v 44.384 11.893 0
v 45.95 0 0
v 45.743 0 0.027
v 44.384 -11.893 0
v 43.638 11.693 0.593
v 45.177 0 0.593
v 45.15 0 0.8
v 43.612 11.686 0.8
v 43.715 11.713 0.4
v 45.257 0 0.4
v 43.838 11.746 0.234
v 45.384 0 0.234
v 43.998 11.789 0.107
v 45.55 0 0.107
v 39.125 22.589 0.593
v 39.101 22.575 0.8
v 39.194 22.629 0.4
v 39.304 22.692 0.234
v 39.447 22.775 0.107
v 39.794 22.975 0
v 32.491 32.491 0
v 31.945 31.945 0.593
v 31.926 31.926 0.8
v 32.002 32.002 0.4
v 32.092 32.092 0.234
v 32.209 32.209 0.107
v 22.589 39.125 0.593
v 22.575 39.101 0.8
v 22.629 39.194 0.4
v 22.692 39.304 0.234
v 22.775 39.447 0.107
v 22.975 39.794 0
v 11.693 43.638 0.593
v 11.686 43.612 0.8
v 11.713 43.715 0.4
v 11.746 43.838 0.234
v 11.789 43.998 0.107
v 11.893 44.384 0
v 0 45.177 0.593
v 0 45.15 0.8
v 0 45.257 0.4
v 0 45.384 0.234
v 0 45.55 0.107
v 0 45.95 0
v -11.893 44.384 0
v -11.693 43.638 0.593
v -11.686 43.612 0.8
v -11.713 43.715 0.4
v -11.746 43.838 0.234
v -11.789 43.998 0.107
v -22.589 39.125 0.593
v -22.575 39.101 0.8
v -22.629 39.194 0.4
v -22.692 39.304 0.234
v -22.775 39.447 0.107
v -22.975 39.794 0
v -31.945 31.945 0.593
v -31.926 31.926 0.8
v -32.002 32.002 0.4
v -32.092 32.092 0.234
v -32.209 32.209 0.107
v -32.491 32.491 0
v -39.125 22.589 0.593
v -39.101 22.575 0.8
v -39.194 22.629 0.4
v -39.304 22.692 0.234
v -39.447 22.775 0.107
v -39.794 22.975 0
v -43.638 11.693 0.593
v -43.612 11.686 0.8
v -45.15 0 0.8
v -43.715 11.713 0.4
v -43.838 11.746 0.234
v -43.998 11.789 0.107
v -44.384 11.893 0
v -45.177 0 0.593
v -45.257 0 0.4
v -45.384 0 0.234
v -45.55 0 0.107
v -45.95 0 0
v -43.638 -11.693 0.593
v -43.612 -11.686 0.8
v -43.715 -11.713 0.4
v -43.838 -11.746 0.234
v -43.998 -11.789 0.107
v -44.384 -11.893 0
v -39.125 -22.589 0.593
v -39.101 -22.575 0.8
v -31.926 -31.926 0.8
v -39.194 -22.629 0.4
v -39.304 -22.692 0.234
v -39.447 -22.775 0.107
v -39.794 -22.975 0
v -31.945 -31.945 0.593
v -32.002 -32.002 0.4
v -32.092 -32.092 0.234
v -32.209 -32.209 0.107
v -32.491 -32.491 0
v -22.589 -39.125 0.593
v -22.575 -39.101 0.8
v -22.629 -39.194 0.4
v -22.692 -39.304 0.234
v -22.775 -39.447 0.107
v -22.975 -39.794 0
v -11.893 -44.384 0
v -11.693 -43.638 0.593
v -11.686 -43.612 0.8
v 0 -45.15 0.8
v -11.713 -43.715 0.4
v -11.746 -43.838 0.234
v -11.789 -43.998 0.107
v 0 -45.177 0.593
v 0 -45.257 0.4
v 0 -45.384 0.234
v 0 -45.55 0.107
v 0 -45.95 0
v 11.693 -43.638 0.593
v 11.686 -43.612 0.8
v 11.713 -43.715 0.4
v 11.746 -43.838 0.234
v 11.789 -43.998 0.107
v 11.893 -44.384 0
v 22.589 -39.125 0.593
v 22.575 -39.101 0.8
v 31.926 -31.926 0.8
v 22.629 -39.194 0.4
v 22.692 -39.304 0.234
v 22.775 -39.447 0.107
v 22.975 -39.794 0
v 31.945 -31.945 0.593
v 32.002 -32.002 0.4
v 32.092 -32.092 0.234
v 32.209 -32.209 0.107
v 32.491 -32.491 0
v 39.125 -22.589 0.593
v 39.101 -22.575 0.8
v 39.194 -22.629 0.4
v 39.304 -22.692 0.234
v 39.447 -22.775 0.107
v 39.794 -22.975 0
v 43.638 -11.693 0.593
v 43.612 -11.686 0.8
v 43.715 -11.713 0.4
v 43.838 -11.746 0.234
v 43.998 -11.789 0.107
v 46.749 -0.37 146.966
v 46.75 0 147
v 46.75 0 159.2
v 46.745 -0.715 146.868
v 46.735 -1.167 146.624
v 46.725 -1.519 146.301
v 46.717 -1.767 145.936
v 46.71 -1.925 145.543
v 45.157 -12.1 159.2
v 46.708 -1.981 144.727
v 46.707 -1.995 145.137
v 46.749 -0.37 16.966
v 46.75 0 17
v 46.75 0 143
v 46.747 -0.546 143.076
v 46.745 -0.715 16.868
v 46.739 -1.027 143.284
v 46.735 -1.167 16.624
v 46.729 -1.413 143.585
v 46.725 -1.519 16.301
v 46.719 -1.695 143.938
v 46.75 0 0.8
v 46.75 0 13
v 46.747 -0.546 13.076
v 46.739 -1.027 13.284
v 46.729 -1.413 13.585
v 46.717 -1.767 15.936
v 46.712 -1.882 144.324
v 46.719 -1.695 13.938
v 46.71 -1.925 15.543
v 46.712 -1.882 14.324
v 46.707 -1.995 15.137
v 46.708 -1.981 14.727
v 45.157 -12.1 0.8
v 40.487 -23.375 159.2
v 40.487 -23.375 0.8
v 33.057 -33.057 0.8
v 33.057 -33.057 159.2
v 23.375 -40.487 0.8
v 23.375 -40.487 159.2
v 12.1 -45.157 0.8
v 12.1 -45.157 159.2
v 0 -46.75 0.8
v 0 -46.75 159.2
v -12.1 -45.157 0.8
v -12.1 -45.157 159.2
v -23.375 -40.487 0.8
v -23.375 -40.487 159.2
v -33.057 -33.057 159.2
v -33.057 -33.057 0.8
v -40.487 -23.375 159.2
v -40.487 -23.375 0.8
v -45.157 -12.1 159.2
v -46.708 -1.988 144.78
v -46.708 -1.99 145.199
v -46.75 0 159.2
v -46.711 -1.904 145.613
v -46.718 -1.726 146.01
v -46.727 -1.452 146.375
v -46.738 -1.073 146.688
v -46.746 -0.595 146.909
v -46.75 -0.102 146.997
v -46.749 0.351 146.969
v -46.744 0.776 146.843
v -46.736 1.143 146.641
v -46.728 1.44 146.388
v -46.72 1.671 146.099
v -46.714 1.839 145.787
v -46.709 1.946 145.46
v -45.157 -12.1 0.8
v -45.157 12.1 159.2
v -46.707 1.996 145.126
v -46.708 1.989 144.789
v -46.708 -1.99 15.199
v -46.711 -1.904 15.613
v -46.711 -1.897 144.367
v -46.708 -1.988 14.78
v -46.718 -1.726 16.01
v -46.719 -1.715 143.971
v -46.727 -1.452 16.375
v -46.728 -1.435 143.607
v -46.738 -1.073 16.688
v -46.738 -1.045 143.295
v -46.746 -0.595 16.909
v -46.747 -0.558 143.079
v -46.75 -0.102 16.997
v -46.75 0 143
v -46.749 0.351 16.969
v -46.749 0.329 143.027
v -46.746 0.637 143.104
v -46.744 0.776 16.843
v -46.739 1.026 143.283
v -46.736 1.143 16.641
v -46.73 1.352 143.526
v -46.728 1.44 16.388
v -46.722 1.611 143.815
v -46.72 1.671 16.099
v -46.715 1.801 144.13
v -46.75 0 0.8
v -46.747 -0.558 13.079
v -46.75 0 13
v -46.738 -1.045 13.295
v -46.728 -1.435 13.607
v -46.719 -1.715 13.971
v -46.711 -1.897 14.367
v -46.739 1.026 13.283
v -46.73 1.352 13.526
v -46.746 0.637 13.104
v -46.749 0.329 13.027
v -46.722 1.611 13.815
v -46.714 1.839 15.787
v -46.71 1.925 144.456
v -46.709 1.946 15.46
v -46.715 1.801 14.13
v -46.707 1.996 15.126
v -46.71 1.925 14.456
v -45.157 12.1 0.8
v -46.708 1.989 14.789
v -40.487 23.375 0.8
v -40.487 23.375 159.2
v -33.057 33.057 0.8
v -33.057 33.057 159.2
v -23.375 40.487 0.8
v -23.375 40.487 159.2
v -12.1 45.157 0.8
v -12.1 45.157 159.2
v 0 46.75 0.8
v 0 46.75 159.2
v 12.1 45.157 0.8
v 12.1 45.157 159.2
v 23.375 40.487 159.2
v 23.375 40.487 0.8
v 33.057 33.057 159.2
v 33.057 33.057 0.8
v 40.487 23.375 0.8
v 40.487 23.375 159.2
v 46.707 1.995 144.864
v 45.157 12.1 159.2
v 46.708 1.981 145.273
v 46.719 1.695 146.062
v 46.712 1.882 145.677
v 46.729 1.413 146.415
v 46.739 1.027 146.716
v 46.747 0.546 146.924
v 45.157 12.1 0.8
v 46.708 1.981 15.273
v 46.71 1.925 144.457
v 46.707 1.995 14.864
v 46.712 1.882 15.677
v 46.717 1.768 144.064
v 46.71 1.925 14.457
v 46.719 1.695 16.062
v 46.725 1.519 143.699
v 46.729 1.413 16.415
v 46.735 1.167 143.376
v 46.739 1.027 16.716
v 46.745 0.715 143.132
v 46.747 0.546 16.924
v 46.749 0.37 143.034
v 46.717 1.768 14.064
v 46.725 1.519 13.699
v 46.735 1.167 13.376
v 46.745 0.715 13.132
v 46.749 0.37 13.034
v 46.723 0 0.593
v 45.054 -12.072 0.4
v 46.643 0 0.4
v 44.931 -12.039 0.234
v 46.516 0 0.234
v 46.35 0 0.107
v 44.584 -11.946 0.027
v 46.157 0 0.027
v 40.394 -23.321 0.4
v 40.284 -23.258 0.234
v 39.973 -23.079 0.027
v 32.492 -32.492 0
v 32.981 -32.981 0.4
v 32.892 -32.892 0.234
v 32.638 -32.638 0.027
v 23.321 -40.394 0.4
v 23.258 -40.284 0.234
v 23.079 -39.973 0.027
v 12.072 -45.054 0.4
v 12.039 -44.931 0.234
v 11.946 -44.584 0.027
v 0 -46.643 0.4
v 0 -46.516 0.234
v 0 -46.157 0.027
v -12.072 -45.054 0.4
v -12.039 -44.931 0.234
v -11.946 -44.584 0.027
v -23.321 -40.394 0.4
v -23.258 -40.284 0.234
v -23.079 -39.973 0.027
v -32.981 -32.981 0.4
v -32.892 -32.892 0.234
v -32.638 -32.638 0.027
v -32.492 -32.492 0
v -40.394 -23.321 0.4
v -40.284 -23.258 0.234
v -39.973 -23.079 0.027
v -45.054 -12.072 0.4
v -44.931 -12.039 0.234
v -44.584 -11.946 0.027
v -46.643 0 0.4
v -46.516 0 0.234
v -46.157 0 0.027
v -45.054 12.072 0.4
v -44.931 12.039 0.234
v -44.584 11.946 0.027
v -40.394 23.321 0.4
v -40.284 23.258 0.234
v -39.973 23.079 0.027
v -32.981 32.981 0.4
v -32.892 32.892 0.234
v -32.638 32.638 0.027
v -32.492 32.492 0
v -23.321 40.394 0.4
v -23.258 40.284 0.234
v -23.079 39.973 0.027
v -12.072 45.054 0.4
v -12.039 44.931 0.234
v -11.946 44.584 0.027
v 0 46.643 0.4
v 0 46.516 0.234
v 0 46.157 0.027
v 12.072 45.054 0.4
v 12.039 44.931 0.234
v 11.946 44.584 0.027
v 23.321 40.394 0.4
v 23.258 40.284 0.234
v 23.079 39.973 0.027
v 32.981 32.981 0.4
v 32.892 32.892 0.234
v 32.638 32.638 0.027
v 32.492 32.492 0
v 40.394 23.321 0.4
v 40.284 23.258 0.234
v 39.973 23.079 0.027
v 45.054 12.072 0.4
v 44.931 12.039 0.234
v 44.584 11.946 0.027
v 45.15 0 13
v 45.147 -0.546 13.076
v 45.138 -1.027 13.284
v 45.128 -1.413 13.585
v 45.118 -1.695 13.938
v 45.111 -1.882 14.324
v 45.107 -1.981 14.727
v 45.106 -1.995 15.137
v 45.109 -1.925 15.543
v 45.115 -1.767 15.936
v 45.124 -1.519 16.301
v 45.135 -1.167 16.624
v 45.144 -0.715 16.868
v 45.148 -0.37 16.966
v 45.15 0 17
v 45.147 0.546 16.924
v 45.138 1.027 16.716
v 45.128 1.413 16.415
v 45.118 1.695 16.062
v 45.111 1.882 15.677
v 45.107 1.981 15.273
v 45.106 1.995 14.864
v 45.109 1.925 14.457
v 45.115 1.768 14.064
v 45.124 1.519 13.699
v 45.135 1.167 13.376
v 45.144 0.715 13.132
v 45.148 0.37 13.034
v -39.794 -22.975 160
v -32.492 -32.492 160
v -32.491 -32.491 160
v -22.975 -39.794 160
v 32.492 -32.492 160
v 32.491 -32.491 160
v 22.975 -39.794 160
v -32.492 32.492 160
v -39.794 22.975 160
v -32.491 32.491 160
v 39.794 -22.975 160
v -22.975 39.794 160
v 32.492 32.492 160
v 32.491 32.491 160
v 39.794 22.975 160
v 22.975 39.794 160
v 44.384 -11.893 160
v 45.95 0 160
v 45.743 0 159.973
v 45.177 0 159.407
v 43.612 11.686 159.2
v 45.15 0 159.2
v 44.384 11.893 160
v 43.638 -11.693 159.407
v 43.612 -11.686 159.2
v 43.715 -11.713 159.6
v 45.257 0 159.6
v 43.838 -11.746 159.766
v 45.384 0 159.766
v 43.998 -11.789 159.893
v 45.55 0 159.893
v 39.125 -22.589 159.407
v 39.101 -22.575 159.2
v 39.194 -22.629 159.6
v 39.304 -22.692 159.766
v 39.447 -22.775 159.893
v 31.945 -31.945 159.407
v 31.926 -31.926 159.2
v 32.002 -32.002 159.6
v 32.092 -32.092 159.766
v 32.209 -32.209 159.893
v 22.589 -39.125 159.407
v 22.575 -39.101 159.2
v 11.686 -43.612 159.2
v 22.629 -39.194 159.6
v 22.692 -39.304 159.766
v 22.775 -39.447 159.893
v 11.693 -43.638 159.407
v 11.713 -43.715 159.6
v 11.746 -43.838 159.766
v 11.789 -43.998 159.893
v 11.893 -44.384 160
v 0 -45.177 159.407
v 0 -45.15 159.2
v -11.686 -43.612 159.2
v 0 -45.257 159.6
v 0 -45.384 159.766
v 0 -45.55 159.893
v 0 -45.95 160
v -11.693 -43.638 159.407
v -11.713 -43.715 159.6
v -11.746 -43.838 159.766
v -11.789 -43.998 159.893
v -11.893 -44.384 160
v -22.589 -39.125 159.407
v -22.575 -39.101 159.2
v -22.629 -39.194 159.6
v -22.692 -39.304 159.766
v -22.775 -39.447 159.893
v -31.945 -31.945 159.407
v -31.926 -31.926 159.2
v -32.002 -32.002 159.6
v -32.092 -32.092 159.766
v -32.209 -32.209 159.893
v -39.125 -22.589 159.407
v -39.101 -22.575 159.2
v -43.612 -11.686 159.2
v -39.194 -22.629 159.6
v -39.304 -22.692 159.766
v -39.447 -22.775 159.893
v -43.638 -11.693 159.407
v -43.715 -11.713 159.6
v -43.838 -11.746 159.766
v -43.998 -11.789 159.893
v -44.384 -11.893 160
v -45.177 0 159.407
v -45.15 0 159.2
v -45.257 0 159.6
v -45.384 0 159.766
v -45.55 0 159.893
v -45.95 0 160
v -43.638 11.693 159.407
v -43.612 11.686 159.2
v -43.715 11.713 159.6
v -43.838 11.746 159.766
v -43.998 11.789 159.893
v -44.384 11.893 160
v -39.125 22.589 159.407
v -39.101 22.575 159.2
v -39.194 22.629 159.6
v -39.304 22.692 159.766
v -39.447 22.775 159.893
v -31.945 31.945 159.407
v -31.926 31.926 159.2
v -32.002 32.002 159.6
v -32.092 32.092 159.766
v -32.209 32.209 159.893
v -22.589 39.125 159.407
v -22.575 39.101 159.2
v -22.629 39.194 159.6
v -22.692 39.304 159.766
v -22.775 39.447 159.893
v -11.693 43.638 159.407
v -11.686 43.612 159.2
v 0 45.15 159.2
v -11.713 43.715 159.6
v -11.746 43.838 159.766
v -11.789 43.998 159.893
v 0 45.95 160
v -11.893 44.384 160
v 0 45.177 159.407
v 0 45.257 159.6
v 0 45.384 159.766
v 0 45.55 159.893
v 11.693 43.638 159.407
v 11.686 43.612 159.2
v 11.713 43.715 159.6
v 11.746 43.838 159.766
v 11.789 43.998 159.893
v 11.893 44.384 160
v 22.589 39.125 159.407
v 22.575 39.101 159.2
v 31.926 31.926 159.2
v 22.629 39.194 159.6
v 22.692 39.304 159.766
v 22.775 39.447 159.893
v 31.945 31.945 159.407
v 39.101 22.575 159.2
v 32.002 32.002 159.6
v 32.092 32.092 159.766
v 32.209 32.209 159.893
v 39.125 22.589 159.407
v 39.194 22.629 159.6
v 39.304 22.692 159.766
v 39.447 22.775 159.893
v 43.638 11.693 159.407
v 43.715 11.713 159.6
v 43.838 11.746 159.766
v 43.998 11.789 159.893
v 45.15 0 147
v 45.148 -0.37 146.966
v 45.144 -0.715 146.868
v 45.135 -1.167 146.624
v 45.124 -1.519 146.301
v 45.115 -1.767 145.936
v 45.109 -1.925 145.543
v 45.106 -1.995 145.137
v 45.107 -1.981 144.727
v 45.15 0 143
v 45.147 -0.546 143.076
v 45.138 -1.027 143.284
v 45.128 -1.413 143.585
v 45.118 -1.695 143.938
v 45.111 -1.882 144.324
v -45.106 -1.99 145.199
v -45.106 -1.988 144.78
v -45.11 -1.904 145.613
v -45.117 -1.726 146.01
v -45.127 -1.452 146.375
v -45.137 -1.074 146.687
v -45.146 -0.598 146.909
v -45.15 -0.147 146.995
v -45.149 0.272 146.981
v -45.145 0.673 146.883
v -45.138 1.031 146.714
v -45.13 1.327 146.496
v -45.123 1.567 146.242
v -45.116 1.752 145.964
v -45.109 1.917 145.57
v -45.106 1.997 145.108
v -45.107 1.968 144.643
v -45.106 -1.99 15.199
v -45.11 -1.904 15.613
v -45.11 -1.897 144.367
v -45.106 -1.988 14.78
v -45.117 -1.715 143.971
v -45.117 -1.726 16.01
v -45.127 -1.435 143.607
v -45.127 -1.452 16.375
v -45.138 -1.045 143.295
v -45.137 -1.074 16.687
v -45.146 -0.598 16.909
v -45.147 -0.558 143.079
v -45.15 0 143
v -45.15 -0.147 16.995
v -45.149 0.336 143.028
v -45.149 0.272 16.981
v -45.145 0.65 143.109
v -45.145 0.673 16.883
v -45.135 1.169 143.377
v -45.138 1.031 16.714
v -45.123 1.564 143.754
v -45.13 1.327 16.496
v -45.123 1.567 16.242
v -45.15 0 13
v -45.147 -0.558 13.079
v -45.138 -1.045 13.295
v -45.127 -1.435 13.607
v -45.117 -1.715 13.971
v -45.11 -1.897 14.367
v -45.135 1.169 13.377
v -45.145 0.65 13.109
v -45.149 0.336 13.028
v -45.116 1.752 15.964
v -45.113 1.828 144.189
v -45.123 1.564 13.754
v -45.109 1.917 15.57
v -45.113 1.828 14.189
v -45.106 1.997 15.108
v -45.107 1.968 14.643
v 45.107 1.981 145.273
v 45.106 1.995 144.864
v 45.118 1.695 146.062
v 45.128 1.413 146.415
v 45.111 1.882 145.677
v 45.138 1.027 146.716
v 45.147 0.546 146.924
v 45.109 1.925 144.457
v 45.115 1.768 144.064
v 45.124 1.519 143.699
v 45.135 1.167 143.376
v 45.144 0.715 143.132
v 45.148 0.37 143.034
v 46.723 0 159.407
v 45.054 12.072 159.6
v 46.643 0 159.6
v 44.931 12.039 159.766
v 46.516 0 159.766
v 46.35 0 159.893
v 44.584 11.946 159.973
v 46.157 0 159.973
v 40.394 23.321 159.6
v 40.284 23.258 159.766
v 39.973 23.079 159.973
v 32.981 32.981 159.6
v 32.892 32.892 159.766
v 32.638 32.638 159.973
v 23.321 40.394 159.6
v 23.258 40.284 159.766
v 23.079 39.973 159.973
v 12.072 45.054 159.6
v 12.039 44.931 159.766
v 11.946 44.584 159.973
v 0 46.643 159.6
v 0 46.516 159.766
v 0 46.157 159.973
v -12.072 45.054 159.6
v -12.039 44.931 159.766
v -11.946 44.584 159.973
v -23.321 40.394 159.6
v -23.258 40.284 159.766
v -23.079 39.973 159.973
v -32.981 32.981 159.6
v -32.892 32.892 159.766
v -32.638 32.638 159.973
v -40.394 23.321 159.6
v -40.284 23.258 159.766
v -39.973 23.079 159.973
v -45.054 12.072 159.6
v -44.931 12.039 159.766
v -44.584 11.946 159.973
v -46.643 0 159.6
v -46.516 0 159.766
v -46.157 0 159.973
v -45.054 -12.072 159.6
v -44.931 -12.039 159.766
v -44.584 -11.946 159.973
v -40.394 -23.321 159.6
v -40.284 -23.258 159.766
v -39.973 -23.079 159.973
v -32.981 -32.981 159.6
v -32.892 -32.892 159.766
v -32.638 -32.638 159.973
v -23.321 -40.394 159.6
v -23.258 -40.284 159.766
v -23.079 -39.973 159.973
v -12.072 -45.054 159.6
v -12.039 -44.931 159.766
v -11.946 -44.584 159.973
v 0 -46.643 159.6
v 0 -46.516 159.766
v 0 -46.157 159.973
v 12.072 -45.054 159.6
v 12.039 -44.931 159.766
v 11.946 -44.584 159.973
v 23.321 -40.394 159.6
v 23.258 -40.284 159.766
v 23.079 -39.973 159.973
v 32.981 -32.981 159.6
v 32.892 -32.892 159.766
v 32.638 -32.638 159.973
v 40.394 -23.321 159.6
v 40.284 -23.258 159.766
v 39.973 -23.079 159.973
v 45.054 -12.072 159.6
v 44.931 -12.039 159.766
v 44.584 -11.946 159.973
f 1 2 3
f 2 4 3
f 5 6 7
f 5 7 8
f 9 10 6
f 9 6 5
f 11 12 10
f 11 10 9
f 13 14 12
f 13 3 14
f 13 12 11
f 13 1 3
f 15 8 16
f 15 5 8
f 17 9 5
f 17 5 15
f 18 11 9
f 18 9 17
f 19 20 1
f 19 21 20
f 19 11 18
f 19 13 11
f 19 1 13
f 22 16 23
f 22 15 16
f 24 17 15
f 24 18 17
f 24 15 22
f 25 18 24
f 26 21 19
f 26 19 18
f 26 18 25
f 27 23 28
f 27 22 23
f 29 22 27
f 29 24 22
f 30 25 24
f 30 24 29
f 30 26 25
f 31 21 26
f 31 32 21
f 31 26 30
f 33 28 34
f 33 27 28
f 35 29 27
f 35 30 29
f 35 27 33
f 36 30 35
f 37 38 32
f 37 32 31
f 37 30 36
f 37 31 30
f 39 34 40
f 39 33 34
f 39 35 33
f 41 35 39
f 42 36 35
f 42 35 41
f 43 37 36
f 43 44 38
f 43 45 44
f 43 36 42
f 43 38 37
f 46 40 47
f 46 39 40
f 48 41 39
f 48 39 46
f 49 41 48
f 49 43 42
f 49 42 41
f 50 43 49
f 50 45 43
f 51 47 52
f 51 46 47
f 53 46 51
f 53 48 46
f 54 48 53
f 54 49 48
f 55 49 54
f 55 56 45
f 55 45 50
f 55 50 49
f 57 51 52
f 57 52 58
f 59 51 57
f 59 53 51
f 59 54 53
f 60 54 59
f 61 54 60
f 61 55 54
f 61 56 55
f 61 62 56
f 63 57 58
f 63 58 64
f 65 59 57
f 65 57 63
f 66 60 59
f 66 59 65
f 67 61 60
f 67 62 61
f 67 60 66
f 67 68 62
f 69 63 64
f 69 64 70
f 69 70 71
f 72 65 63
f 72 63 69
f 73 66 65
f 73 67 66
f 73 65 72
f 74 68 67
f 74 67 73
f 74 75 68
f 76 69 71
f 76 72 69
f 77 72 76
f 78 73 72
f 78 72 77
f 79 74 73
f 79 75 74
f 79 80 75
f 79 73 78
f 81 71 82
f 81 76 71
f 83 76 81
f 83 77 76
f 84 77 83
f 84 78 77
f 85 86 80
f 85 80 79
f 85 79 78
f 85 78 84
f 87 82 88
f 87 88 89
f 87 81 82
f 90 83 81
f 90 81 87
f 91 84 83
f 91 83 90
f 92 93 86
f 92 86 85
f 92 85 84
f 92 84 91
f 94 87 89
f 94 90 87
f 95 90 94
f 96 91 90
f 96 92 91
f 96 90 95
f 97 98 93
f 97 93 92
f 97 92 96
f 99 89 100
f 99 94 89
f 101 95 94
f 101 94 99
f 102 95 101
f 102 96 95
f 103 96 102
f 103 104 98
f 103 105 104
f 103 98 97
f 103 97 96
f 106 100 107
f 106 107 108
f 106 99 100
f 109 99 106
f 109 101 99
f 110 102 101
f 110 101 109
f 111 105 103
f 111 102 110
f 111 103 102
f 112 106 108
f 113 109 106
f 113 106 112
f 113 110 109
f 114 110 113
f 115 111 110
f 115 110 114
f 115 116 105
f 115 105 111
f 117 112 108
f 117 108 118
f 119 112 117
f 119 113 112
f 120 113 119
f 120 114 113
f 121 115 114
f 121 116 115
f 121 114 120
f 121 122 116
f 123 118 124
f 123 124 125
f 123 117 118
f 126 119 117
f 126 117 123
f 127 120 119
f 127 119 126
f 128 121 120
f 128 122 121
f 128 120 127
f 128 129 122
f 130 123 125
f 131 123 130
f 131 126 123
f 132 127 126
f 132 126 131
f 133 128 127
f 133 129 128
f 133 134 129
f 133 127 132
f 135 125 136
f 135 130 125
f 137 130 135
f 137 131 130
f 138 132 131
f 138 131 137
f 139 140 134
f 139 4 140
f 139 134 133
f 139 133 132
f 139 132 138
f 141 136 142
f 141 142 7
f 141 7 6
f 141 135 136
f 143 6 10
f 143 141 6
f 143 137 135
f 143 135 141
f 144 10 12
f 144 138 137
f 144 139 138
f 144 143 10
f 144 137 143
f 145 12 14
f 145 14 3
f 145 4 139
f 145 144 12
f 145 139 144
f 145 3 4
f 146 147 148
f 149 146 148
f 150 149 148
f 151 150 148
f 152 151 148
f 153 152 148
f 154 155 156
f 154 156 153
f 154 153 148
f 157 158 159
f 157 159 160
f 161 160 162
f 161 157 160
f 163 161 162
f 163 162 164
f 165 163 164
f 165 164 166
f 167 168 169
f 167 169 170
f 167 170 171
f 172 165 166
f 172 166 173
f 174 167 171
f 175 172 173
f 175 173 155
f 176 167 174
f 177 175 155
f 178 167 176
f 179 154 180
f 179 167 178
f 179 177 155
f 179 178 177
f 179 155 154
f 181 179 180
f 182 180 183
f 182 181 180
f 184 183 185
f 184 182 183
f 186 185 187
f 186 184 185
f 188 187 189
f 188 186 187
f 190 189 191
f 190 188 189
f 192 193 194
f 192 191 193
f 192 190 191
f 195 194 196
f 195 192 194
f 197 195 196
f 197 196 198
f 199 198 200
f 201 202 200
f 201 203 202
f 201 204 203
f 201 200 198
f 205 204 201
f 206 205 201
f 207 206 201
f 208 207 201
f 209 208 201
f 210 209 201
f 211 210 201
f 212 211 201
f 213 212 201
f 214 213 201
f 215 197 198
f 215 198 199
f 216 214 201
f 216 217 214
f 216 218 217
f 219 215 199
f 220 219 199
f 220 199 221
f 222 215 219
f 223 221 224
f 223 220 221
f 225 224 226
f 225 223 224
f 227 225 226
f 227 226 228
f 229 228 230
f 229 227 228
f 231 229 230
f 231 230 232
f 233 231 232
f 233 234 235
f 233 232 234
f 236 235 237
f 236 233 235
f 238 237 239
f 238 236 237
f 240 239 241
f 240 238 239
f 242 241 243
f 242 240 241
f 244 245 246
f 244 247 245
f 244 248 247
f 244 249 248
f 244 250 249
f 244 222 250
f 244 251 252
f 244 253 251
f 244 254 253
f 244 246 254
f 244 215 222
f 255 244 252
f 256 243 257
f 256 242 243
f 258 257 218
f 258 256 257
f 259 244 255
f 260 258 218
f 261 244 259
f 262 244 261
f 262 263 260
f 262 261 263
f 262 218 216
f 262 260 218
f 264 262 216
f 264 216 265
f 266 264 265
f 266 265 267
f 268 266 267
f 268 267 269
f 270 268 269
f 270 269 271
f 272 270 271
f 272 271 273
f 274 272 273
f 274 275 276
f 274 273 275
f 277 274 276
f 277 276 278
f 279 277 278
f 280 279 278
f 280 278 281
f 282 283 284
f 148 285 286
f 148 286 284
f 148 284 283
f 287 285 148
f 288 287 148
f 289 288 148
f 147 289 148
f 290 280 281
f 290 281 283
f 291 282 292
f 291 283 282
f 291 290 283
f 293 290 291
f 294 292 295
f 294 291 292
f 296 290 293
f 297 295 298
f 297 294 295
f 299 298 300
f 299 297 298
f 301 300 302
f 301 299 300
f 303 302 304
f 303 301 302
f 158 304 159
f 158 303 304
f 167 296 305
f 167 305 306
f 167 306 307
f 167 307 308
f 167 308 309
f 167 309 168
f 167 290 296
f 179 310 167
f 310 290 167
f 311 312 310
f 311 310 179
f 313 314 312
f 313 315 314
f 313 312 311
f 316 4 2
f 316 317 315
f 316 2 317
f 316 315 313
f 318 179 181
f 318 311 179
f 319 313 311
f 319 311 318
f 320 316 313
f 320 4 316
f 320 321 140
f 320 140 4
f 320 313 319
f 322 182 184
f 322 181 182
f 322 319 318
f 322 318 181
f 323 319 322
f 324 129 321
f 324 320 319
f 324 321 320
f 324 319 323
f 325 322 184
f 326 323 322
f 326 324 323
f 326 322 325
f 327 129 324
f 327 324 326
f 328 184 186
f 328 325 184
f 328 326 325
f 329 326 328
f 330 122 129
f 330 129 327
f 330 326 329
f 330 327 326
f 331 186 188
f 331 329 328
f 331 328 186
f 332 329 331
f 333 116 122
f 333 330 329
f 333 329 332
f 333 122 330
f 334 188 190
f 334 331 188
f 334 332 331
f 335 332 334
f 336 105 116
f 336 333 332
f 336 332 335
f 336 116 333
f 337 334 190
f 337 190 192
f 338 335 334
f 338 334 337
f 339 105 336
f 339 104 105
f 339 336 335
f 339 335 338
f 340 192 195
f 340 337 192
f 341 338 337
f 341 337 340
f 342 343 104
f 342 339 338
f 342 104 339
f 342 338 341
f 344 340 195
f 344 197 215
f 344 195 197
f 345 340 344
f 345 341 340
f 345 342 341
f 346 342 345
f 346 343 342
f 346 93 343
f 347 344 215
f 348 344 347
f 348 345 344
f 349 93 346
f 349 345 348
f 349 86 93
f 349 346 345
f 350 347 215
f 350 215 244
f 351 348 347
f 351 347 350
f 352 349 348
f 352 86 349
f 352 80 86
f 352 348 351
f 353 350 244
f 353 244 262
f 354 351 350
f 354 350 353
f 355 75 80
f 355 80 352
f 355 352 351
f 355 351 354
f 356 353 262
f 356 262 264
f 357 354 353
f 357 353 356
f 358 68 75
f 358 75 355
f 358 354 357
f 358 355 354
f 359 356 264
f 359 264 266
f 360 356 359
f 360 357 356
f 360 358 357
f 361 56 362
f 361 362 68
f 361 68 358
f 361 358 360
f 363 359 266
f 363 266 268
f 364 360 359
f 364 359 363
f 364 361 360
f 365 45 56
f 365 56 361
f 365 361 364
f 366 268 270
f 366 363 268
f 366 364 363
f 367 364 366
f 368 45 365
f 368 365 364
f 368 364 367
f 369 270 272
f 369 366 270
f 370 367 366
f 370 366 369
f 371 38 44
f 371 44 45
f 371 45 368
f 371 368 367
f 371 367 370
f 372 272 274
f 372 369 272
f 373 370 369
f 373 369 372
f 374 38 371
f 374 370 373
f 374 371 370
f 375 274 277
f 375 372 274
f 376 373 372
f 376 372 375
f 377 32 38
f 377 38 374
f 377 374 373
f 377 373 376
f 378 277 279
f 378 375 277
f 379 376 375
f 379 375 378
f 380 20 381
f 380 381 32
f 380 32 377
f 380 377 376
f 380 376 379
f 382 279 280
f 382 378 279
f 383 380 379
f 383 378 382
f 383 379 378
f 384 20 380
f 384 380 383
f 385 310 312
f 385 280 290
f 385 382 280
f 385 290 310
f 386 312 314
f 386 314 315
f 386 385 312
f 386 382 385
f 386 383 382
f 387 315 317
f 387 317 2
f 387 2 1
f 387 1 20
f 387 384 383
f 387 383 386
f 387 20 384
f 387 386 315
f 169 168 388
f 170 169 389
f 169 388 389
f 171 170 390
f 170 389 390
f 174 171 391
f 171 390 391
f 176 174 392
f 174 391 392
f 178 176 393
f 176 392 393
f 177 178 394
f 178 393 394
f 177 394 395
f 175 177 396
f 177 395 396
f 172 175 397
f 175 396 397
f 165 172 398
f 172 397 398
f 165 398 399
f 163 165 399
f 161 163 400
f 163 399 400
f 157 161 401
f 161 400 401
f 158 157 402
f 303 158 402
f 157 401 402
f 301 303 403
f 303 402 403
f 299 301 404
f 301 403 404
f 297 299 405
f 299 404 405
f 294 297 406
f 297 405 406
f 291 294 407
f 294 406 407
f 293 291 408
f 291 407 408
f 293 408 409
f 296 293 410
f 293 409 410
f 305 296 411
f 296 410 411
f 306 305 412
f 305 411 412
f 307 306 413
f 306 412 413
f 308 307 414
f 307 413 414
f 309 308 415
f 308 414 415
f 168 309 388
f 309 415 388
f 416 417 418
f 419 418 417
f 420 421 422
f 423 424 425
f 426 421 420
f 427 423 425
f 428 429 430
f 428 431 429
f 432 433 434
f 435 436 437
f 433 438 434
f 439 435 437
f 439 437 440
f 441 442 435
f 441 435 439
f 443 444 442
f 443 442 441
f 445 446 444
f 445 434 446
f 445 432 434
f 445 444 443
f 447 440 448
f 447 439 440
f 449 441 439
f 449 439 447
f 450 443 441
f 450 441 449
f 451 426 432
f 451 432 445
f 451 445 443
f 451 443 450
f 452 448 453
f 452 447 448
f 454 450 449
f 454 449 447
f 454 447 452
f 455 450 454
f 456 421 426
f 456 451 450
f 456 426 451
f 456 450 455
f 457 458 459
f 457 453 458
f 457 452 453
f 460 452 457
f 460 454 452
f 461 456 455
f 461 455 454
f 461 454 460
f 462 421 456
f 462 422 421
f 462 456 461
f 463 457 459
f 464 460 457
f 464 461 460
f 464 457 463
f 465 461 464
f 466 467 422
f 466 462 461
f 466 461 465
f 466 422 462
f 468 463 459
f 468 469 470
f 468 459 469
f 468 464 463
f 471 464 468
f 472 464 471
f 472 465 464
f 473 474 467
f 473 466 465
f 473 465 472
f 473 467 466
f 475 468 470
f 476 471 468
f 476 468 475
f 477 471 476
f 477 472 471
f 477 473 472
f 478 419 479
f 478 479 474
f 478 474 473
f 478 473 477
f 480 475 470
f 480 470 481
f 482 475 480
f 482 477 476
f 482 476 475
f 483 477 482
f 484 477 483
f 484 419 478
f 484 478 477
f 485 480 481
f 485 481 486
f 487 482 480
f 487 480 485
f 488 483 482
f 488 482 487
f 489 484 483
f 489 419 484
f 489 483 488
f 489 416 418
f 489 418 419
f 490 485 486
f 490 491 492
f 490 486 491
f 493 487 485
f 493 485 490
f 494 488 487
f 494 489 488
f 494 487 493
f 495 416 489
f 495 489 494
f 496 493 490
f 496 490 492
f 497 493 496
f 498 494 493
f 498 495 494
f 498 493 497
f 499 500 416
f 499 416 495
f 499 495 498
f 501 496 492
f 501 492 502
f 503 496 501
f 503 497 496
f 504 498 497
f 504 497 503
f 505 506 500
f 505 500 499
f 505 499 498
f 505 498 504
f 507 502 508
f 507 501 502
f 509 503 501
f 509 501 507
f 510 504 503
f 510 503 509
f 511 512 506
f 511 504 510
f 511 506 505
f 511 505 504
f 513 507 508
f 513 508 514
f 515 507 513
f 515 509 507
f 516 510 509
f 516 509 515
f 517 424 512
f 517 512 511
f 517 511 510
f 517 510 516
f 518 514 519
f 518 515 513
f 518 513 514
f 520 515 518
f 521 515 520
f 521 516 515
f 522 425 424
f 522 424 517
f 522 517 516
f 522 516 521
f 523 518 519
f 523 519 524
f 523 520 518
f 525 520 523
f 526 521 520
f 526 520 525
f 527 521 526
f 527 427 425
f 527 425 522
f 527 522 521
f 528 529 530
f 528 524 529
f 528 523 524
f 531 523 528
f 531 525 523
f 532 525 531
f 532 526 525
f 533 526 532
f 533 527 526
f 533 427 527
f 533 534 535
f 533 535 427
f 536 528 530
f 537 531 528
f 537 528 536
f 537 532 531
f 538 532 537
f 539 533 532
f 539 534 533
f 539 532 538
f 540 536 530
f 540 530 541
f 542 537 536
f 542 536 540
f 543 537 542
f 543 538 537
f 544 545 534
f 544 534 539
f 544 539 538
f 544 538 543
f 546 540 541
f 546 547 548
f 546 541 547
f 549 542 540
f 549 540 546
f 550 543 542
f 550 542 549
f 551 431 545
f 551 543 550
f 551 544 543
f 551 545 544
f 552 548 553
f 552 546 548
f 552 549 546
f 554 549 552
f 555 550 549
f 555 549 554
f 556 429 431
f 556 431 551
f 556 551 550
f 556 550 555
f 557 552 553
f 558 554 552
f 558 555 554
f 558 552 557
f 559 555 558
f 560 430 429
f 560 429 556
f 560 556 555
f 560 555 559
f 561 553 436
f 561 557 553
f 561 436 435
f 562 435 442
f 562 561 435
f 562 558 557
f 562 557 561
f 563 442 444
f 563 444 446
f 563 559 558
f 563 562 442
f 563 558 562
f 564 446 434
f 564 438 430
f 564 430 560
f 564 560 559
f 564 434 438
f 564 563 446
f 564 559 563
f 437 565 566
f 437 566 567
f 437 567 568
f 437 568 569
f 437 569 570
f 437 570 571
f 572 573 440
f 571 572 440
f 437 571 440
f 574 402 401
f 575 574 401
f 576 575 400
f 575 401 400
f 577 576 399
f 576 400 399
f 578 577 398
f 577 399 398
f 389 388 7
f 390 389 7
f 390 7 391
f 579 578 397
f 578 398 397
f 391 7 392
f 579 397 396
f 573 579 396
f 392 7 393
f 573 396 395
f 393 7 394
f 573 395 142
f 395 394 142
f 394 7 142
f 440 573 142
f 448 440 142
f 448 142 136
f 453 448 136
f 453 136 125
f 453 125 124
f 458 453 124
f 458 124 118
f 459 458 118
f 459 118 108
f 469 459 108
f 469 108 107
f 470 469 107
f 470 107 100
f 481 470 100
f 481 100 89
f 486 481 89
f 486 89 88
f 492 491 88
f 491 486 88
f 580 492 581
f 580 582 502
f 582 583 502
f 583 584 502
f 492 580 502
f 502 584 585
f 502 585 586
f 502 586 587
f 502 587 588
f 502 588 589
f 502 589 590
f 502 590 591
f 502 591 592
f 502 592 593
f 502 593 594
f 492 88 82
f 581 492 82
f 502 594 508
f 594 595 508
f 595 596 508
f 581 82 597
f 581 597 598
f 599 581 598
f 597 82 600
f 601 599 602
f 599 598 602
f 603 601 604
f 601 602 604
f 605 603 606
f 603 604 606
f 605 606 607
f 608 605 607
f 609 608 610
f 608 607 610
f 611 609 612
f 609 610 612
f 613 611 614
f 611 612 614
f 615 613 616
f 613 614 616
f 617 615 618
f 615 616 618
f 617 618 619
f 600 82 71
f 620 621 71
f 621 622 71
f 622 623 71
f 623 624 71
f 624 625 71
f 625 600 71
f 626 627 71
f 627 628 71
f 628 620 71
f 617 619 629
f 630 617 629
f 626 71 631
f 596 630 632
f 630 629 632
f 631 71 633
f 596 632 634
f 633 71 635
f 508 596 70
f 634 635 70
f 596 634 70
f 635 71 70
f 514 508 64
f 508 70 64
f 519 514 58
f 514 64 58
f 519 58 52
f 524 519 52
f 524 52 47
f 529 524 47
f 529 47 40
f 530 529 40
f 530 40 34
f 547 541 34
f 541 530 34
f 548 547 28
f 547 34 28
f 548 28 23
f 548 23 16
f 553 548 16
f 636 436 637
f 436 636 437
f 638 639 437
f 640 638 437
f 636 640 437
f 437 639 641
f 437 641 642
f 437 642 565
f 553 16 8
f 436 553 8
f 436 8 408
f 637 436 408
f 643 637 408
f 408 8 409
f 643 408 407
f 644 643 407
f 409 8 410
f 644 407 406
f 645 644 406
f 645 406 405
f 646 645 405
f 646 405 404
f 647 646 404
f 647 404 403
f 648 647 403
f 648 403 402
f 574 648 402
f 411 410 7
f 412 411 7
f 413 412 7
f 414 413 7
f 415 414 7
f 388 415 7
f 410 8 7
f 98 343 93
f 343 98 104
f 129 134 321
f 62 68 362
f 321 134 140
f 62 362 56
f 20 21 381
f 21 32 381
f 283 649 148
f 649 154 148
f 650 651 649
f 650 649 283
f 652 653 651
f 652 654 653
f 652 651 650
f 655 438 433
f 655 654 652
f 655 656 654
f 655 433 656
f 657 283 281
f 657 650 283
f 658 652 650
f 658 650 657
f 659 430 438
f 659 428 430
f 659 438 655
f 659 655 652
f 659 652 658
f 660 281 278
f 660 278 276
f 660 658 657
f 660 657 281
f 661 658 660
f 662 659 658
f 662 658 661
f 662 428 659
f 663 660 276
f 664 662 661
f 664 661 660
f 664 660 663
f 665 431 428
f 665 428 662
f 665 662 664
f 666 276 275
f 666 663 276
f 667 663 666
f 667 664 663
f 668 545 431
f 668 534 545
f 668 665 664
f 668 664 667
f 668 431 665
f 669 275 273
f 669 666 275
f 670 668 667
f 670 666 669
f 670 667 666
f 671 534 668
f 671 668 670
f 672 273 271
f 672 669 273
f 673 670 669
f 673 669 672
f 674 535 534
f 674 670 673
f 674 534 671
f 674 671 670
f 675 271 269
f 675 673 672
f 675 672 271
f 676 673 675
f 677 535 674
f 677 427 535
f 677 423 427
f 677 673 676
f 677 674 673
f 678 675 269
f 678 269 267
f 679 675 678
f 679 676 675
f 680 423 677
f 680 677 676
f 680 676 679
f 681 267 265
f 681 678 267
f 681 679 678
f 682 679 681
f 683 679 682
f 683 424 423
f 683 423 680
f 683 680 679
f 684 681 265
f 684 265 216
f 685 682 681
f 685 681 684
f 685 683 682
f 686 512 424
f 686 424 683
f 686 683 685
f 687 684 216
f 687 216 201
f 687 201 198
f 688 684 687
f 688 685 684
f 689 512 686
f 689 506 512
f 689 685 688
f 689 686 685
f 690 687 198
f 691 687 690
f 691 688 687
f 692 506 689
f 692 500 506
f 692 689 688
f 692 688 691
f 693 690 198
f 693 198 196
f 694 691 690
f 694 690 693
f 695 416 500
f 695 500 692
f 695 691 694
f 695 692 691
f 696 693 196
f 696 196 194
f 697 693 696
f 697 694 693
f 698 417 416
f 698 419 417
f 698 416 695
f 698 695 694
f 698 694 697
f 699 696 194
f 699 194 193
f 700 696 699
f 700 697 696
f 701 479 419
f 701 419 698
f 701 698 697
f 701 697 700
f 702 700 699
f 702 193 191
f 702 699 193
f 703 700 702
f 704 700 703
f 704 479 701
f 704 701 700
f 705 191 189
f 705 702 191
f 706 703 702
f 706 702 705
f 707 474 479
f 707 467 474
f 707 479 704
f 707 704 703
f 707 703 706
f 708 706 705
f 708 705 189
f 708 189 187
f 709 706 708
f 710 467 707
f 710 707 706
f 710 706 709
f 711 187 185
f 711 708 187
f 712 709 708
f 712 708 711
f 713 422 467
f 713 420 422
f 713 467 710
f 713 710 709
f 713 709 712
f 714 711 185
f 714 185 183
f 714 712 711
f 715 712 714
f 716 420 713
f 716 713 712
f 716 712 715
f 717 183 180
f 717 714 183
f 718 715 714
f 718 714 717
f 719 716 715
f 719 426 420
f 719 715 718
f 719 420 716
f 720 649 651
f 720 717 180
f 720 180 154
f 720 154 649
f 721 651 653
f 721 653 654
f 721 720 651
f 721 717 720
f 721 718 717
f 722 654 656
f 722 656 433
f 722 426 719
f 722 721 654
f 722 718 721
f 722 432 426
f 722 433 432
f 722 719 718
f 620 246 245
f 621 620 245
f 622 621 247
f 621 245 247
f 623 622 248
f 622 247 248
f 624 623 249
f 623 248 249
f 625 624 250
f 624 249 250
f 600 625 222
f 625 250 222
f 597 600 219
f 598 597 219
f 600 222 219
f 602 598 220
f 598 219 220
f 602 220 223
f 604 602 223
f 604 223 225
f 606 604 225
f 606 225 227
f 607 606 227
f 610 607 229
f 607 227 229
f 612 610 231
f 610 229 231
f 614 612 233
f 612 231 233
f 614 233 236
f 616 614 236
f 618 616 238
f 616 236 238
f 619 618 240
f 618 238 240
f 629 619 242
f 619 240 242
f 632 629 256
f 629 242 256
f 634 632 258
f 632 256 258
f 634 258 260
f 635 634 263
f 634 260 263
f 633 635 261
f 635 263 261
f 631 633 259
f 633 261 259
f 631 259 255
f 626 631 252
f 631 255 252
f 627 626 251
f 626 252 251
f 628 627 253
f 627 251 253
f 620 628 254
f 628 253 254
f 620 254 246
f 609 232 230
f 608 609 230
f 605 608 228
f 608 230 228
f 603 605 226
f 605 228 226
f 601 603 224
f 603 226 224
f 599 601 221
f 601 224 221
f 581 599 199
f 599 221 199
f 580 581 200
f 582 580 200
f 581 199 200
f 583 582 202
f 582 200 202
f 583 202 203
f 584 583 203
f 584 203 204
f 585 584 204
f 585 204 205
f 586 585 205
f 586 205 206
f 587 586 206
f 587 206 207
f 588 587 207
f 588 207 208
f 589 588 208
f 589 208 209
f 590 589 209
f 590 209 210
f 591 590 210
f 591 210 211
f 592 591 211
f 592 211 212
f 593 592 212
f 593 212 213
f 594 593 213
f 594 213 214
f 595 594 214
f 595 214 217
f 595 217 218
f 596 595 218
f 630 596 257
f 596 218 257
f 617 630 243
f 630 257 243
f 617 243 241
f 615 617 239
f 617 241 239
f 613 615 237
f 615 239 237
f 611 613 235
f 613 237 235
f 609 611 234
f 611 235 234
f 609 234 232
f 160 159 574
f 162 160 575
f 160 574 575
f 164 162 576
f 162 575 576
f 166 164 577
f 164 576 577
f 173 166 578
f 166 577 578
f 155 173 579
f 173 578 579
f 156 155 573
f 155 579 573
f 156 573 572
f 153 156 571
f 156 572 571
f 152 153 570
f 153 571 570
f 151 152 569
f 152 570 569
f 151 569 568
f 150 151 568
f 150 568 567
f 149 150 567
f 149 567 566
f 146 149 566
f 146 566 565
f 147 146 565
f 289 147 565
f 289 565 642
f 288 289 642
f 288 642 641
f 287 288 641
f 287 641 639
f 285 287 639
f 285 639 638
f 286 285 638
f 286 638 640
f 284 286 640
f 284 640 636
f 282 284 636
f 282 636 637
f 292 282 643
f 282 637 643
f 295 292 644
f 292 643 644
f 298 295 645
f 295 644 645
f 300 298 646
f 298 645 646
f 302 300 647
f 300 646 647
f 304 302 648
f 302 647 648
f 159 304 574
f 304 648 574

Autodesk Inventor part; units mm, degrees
ref_plane "XZ Plane" through (0, 0, 0) normal (0, 1, 0) x (-1, 0, 0)
ref_plane "XY Plane" through (0, 0, 0) normal (0, 0, 1) x (1, 0, 0)
sketch "Эскиз1" plane through (0, 0, 0) normal (0, 0, 1) x (1, 0, 0)
  circle A0 centre (0, 0) radius 45.15
  circle A1 centre (0, 0) radius 46.75
  dimension "d0" = 90.3
  dimension "d1" = 93.5
extrude "Выдавливание1" add sketch "Эскиз1" along normal blind 160
fillet "Сопряжение1" radius 0.8 4 edges at (-46.75, 0, 160) (-45.15, 0, 160) (-46.75, 0, 0) (-45.15, 0, 0)
sketch "Эскиз2" plane through (0, 0, 0) normal (1, 0, 0) x (0, 1, 0)
  circle A0 centre (0, 15) radius 2
  circle A1 centre (0, 145) radius 2
  point P0 (0, 0)
  dimension "d5" = 4
  dimension "d6" = 4
  dimension "d7" = 15
  dimension "d8" = 145
hole "Отверстие1" at (0, 0, 145) at (0, 0, 15) direction (-1, 0, 0) diameter 4 end through all both
equation "\"d0\" = dInternal"
equation "\"d1\" = dInternal + wallThickness"
equation "\"d2\" = tubeHeight"
equation "\"d4\" = 0.25 * wallThickness"
equation "\"d5\" = dHole"
equation "\"d6\" = dHole"
equation "\"d7\" = distanceHoles"
equation "\"d8\" = tubeHeight - distanceHoles"
equation "\"d9\" = dHole"
equation "\"dInternal\" = 90.3"
equation "\"wallThickness\" = 3.2"
equation "\"tubeHeight\" = 160"
equation "\"dHole\" = 4"
equation "\"distanceHoles\" = 15"
properties part number "EimarTube"
